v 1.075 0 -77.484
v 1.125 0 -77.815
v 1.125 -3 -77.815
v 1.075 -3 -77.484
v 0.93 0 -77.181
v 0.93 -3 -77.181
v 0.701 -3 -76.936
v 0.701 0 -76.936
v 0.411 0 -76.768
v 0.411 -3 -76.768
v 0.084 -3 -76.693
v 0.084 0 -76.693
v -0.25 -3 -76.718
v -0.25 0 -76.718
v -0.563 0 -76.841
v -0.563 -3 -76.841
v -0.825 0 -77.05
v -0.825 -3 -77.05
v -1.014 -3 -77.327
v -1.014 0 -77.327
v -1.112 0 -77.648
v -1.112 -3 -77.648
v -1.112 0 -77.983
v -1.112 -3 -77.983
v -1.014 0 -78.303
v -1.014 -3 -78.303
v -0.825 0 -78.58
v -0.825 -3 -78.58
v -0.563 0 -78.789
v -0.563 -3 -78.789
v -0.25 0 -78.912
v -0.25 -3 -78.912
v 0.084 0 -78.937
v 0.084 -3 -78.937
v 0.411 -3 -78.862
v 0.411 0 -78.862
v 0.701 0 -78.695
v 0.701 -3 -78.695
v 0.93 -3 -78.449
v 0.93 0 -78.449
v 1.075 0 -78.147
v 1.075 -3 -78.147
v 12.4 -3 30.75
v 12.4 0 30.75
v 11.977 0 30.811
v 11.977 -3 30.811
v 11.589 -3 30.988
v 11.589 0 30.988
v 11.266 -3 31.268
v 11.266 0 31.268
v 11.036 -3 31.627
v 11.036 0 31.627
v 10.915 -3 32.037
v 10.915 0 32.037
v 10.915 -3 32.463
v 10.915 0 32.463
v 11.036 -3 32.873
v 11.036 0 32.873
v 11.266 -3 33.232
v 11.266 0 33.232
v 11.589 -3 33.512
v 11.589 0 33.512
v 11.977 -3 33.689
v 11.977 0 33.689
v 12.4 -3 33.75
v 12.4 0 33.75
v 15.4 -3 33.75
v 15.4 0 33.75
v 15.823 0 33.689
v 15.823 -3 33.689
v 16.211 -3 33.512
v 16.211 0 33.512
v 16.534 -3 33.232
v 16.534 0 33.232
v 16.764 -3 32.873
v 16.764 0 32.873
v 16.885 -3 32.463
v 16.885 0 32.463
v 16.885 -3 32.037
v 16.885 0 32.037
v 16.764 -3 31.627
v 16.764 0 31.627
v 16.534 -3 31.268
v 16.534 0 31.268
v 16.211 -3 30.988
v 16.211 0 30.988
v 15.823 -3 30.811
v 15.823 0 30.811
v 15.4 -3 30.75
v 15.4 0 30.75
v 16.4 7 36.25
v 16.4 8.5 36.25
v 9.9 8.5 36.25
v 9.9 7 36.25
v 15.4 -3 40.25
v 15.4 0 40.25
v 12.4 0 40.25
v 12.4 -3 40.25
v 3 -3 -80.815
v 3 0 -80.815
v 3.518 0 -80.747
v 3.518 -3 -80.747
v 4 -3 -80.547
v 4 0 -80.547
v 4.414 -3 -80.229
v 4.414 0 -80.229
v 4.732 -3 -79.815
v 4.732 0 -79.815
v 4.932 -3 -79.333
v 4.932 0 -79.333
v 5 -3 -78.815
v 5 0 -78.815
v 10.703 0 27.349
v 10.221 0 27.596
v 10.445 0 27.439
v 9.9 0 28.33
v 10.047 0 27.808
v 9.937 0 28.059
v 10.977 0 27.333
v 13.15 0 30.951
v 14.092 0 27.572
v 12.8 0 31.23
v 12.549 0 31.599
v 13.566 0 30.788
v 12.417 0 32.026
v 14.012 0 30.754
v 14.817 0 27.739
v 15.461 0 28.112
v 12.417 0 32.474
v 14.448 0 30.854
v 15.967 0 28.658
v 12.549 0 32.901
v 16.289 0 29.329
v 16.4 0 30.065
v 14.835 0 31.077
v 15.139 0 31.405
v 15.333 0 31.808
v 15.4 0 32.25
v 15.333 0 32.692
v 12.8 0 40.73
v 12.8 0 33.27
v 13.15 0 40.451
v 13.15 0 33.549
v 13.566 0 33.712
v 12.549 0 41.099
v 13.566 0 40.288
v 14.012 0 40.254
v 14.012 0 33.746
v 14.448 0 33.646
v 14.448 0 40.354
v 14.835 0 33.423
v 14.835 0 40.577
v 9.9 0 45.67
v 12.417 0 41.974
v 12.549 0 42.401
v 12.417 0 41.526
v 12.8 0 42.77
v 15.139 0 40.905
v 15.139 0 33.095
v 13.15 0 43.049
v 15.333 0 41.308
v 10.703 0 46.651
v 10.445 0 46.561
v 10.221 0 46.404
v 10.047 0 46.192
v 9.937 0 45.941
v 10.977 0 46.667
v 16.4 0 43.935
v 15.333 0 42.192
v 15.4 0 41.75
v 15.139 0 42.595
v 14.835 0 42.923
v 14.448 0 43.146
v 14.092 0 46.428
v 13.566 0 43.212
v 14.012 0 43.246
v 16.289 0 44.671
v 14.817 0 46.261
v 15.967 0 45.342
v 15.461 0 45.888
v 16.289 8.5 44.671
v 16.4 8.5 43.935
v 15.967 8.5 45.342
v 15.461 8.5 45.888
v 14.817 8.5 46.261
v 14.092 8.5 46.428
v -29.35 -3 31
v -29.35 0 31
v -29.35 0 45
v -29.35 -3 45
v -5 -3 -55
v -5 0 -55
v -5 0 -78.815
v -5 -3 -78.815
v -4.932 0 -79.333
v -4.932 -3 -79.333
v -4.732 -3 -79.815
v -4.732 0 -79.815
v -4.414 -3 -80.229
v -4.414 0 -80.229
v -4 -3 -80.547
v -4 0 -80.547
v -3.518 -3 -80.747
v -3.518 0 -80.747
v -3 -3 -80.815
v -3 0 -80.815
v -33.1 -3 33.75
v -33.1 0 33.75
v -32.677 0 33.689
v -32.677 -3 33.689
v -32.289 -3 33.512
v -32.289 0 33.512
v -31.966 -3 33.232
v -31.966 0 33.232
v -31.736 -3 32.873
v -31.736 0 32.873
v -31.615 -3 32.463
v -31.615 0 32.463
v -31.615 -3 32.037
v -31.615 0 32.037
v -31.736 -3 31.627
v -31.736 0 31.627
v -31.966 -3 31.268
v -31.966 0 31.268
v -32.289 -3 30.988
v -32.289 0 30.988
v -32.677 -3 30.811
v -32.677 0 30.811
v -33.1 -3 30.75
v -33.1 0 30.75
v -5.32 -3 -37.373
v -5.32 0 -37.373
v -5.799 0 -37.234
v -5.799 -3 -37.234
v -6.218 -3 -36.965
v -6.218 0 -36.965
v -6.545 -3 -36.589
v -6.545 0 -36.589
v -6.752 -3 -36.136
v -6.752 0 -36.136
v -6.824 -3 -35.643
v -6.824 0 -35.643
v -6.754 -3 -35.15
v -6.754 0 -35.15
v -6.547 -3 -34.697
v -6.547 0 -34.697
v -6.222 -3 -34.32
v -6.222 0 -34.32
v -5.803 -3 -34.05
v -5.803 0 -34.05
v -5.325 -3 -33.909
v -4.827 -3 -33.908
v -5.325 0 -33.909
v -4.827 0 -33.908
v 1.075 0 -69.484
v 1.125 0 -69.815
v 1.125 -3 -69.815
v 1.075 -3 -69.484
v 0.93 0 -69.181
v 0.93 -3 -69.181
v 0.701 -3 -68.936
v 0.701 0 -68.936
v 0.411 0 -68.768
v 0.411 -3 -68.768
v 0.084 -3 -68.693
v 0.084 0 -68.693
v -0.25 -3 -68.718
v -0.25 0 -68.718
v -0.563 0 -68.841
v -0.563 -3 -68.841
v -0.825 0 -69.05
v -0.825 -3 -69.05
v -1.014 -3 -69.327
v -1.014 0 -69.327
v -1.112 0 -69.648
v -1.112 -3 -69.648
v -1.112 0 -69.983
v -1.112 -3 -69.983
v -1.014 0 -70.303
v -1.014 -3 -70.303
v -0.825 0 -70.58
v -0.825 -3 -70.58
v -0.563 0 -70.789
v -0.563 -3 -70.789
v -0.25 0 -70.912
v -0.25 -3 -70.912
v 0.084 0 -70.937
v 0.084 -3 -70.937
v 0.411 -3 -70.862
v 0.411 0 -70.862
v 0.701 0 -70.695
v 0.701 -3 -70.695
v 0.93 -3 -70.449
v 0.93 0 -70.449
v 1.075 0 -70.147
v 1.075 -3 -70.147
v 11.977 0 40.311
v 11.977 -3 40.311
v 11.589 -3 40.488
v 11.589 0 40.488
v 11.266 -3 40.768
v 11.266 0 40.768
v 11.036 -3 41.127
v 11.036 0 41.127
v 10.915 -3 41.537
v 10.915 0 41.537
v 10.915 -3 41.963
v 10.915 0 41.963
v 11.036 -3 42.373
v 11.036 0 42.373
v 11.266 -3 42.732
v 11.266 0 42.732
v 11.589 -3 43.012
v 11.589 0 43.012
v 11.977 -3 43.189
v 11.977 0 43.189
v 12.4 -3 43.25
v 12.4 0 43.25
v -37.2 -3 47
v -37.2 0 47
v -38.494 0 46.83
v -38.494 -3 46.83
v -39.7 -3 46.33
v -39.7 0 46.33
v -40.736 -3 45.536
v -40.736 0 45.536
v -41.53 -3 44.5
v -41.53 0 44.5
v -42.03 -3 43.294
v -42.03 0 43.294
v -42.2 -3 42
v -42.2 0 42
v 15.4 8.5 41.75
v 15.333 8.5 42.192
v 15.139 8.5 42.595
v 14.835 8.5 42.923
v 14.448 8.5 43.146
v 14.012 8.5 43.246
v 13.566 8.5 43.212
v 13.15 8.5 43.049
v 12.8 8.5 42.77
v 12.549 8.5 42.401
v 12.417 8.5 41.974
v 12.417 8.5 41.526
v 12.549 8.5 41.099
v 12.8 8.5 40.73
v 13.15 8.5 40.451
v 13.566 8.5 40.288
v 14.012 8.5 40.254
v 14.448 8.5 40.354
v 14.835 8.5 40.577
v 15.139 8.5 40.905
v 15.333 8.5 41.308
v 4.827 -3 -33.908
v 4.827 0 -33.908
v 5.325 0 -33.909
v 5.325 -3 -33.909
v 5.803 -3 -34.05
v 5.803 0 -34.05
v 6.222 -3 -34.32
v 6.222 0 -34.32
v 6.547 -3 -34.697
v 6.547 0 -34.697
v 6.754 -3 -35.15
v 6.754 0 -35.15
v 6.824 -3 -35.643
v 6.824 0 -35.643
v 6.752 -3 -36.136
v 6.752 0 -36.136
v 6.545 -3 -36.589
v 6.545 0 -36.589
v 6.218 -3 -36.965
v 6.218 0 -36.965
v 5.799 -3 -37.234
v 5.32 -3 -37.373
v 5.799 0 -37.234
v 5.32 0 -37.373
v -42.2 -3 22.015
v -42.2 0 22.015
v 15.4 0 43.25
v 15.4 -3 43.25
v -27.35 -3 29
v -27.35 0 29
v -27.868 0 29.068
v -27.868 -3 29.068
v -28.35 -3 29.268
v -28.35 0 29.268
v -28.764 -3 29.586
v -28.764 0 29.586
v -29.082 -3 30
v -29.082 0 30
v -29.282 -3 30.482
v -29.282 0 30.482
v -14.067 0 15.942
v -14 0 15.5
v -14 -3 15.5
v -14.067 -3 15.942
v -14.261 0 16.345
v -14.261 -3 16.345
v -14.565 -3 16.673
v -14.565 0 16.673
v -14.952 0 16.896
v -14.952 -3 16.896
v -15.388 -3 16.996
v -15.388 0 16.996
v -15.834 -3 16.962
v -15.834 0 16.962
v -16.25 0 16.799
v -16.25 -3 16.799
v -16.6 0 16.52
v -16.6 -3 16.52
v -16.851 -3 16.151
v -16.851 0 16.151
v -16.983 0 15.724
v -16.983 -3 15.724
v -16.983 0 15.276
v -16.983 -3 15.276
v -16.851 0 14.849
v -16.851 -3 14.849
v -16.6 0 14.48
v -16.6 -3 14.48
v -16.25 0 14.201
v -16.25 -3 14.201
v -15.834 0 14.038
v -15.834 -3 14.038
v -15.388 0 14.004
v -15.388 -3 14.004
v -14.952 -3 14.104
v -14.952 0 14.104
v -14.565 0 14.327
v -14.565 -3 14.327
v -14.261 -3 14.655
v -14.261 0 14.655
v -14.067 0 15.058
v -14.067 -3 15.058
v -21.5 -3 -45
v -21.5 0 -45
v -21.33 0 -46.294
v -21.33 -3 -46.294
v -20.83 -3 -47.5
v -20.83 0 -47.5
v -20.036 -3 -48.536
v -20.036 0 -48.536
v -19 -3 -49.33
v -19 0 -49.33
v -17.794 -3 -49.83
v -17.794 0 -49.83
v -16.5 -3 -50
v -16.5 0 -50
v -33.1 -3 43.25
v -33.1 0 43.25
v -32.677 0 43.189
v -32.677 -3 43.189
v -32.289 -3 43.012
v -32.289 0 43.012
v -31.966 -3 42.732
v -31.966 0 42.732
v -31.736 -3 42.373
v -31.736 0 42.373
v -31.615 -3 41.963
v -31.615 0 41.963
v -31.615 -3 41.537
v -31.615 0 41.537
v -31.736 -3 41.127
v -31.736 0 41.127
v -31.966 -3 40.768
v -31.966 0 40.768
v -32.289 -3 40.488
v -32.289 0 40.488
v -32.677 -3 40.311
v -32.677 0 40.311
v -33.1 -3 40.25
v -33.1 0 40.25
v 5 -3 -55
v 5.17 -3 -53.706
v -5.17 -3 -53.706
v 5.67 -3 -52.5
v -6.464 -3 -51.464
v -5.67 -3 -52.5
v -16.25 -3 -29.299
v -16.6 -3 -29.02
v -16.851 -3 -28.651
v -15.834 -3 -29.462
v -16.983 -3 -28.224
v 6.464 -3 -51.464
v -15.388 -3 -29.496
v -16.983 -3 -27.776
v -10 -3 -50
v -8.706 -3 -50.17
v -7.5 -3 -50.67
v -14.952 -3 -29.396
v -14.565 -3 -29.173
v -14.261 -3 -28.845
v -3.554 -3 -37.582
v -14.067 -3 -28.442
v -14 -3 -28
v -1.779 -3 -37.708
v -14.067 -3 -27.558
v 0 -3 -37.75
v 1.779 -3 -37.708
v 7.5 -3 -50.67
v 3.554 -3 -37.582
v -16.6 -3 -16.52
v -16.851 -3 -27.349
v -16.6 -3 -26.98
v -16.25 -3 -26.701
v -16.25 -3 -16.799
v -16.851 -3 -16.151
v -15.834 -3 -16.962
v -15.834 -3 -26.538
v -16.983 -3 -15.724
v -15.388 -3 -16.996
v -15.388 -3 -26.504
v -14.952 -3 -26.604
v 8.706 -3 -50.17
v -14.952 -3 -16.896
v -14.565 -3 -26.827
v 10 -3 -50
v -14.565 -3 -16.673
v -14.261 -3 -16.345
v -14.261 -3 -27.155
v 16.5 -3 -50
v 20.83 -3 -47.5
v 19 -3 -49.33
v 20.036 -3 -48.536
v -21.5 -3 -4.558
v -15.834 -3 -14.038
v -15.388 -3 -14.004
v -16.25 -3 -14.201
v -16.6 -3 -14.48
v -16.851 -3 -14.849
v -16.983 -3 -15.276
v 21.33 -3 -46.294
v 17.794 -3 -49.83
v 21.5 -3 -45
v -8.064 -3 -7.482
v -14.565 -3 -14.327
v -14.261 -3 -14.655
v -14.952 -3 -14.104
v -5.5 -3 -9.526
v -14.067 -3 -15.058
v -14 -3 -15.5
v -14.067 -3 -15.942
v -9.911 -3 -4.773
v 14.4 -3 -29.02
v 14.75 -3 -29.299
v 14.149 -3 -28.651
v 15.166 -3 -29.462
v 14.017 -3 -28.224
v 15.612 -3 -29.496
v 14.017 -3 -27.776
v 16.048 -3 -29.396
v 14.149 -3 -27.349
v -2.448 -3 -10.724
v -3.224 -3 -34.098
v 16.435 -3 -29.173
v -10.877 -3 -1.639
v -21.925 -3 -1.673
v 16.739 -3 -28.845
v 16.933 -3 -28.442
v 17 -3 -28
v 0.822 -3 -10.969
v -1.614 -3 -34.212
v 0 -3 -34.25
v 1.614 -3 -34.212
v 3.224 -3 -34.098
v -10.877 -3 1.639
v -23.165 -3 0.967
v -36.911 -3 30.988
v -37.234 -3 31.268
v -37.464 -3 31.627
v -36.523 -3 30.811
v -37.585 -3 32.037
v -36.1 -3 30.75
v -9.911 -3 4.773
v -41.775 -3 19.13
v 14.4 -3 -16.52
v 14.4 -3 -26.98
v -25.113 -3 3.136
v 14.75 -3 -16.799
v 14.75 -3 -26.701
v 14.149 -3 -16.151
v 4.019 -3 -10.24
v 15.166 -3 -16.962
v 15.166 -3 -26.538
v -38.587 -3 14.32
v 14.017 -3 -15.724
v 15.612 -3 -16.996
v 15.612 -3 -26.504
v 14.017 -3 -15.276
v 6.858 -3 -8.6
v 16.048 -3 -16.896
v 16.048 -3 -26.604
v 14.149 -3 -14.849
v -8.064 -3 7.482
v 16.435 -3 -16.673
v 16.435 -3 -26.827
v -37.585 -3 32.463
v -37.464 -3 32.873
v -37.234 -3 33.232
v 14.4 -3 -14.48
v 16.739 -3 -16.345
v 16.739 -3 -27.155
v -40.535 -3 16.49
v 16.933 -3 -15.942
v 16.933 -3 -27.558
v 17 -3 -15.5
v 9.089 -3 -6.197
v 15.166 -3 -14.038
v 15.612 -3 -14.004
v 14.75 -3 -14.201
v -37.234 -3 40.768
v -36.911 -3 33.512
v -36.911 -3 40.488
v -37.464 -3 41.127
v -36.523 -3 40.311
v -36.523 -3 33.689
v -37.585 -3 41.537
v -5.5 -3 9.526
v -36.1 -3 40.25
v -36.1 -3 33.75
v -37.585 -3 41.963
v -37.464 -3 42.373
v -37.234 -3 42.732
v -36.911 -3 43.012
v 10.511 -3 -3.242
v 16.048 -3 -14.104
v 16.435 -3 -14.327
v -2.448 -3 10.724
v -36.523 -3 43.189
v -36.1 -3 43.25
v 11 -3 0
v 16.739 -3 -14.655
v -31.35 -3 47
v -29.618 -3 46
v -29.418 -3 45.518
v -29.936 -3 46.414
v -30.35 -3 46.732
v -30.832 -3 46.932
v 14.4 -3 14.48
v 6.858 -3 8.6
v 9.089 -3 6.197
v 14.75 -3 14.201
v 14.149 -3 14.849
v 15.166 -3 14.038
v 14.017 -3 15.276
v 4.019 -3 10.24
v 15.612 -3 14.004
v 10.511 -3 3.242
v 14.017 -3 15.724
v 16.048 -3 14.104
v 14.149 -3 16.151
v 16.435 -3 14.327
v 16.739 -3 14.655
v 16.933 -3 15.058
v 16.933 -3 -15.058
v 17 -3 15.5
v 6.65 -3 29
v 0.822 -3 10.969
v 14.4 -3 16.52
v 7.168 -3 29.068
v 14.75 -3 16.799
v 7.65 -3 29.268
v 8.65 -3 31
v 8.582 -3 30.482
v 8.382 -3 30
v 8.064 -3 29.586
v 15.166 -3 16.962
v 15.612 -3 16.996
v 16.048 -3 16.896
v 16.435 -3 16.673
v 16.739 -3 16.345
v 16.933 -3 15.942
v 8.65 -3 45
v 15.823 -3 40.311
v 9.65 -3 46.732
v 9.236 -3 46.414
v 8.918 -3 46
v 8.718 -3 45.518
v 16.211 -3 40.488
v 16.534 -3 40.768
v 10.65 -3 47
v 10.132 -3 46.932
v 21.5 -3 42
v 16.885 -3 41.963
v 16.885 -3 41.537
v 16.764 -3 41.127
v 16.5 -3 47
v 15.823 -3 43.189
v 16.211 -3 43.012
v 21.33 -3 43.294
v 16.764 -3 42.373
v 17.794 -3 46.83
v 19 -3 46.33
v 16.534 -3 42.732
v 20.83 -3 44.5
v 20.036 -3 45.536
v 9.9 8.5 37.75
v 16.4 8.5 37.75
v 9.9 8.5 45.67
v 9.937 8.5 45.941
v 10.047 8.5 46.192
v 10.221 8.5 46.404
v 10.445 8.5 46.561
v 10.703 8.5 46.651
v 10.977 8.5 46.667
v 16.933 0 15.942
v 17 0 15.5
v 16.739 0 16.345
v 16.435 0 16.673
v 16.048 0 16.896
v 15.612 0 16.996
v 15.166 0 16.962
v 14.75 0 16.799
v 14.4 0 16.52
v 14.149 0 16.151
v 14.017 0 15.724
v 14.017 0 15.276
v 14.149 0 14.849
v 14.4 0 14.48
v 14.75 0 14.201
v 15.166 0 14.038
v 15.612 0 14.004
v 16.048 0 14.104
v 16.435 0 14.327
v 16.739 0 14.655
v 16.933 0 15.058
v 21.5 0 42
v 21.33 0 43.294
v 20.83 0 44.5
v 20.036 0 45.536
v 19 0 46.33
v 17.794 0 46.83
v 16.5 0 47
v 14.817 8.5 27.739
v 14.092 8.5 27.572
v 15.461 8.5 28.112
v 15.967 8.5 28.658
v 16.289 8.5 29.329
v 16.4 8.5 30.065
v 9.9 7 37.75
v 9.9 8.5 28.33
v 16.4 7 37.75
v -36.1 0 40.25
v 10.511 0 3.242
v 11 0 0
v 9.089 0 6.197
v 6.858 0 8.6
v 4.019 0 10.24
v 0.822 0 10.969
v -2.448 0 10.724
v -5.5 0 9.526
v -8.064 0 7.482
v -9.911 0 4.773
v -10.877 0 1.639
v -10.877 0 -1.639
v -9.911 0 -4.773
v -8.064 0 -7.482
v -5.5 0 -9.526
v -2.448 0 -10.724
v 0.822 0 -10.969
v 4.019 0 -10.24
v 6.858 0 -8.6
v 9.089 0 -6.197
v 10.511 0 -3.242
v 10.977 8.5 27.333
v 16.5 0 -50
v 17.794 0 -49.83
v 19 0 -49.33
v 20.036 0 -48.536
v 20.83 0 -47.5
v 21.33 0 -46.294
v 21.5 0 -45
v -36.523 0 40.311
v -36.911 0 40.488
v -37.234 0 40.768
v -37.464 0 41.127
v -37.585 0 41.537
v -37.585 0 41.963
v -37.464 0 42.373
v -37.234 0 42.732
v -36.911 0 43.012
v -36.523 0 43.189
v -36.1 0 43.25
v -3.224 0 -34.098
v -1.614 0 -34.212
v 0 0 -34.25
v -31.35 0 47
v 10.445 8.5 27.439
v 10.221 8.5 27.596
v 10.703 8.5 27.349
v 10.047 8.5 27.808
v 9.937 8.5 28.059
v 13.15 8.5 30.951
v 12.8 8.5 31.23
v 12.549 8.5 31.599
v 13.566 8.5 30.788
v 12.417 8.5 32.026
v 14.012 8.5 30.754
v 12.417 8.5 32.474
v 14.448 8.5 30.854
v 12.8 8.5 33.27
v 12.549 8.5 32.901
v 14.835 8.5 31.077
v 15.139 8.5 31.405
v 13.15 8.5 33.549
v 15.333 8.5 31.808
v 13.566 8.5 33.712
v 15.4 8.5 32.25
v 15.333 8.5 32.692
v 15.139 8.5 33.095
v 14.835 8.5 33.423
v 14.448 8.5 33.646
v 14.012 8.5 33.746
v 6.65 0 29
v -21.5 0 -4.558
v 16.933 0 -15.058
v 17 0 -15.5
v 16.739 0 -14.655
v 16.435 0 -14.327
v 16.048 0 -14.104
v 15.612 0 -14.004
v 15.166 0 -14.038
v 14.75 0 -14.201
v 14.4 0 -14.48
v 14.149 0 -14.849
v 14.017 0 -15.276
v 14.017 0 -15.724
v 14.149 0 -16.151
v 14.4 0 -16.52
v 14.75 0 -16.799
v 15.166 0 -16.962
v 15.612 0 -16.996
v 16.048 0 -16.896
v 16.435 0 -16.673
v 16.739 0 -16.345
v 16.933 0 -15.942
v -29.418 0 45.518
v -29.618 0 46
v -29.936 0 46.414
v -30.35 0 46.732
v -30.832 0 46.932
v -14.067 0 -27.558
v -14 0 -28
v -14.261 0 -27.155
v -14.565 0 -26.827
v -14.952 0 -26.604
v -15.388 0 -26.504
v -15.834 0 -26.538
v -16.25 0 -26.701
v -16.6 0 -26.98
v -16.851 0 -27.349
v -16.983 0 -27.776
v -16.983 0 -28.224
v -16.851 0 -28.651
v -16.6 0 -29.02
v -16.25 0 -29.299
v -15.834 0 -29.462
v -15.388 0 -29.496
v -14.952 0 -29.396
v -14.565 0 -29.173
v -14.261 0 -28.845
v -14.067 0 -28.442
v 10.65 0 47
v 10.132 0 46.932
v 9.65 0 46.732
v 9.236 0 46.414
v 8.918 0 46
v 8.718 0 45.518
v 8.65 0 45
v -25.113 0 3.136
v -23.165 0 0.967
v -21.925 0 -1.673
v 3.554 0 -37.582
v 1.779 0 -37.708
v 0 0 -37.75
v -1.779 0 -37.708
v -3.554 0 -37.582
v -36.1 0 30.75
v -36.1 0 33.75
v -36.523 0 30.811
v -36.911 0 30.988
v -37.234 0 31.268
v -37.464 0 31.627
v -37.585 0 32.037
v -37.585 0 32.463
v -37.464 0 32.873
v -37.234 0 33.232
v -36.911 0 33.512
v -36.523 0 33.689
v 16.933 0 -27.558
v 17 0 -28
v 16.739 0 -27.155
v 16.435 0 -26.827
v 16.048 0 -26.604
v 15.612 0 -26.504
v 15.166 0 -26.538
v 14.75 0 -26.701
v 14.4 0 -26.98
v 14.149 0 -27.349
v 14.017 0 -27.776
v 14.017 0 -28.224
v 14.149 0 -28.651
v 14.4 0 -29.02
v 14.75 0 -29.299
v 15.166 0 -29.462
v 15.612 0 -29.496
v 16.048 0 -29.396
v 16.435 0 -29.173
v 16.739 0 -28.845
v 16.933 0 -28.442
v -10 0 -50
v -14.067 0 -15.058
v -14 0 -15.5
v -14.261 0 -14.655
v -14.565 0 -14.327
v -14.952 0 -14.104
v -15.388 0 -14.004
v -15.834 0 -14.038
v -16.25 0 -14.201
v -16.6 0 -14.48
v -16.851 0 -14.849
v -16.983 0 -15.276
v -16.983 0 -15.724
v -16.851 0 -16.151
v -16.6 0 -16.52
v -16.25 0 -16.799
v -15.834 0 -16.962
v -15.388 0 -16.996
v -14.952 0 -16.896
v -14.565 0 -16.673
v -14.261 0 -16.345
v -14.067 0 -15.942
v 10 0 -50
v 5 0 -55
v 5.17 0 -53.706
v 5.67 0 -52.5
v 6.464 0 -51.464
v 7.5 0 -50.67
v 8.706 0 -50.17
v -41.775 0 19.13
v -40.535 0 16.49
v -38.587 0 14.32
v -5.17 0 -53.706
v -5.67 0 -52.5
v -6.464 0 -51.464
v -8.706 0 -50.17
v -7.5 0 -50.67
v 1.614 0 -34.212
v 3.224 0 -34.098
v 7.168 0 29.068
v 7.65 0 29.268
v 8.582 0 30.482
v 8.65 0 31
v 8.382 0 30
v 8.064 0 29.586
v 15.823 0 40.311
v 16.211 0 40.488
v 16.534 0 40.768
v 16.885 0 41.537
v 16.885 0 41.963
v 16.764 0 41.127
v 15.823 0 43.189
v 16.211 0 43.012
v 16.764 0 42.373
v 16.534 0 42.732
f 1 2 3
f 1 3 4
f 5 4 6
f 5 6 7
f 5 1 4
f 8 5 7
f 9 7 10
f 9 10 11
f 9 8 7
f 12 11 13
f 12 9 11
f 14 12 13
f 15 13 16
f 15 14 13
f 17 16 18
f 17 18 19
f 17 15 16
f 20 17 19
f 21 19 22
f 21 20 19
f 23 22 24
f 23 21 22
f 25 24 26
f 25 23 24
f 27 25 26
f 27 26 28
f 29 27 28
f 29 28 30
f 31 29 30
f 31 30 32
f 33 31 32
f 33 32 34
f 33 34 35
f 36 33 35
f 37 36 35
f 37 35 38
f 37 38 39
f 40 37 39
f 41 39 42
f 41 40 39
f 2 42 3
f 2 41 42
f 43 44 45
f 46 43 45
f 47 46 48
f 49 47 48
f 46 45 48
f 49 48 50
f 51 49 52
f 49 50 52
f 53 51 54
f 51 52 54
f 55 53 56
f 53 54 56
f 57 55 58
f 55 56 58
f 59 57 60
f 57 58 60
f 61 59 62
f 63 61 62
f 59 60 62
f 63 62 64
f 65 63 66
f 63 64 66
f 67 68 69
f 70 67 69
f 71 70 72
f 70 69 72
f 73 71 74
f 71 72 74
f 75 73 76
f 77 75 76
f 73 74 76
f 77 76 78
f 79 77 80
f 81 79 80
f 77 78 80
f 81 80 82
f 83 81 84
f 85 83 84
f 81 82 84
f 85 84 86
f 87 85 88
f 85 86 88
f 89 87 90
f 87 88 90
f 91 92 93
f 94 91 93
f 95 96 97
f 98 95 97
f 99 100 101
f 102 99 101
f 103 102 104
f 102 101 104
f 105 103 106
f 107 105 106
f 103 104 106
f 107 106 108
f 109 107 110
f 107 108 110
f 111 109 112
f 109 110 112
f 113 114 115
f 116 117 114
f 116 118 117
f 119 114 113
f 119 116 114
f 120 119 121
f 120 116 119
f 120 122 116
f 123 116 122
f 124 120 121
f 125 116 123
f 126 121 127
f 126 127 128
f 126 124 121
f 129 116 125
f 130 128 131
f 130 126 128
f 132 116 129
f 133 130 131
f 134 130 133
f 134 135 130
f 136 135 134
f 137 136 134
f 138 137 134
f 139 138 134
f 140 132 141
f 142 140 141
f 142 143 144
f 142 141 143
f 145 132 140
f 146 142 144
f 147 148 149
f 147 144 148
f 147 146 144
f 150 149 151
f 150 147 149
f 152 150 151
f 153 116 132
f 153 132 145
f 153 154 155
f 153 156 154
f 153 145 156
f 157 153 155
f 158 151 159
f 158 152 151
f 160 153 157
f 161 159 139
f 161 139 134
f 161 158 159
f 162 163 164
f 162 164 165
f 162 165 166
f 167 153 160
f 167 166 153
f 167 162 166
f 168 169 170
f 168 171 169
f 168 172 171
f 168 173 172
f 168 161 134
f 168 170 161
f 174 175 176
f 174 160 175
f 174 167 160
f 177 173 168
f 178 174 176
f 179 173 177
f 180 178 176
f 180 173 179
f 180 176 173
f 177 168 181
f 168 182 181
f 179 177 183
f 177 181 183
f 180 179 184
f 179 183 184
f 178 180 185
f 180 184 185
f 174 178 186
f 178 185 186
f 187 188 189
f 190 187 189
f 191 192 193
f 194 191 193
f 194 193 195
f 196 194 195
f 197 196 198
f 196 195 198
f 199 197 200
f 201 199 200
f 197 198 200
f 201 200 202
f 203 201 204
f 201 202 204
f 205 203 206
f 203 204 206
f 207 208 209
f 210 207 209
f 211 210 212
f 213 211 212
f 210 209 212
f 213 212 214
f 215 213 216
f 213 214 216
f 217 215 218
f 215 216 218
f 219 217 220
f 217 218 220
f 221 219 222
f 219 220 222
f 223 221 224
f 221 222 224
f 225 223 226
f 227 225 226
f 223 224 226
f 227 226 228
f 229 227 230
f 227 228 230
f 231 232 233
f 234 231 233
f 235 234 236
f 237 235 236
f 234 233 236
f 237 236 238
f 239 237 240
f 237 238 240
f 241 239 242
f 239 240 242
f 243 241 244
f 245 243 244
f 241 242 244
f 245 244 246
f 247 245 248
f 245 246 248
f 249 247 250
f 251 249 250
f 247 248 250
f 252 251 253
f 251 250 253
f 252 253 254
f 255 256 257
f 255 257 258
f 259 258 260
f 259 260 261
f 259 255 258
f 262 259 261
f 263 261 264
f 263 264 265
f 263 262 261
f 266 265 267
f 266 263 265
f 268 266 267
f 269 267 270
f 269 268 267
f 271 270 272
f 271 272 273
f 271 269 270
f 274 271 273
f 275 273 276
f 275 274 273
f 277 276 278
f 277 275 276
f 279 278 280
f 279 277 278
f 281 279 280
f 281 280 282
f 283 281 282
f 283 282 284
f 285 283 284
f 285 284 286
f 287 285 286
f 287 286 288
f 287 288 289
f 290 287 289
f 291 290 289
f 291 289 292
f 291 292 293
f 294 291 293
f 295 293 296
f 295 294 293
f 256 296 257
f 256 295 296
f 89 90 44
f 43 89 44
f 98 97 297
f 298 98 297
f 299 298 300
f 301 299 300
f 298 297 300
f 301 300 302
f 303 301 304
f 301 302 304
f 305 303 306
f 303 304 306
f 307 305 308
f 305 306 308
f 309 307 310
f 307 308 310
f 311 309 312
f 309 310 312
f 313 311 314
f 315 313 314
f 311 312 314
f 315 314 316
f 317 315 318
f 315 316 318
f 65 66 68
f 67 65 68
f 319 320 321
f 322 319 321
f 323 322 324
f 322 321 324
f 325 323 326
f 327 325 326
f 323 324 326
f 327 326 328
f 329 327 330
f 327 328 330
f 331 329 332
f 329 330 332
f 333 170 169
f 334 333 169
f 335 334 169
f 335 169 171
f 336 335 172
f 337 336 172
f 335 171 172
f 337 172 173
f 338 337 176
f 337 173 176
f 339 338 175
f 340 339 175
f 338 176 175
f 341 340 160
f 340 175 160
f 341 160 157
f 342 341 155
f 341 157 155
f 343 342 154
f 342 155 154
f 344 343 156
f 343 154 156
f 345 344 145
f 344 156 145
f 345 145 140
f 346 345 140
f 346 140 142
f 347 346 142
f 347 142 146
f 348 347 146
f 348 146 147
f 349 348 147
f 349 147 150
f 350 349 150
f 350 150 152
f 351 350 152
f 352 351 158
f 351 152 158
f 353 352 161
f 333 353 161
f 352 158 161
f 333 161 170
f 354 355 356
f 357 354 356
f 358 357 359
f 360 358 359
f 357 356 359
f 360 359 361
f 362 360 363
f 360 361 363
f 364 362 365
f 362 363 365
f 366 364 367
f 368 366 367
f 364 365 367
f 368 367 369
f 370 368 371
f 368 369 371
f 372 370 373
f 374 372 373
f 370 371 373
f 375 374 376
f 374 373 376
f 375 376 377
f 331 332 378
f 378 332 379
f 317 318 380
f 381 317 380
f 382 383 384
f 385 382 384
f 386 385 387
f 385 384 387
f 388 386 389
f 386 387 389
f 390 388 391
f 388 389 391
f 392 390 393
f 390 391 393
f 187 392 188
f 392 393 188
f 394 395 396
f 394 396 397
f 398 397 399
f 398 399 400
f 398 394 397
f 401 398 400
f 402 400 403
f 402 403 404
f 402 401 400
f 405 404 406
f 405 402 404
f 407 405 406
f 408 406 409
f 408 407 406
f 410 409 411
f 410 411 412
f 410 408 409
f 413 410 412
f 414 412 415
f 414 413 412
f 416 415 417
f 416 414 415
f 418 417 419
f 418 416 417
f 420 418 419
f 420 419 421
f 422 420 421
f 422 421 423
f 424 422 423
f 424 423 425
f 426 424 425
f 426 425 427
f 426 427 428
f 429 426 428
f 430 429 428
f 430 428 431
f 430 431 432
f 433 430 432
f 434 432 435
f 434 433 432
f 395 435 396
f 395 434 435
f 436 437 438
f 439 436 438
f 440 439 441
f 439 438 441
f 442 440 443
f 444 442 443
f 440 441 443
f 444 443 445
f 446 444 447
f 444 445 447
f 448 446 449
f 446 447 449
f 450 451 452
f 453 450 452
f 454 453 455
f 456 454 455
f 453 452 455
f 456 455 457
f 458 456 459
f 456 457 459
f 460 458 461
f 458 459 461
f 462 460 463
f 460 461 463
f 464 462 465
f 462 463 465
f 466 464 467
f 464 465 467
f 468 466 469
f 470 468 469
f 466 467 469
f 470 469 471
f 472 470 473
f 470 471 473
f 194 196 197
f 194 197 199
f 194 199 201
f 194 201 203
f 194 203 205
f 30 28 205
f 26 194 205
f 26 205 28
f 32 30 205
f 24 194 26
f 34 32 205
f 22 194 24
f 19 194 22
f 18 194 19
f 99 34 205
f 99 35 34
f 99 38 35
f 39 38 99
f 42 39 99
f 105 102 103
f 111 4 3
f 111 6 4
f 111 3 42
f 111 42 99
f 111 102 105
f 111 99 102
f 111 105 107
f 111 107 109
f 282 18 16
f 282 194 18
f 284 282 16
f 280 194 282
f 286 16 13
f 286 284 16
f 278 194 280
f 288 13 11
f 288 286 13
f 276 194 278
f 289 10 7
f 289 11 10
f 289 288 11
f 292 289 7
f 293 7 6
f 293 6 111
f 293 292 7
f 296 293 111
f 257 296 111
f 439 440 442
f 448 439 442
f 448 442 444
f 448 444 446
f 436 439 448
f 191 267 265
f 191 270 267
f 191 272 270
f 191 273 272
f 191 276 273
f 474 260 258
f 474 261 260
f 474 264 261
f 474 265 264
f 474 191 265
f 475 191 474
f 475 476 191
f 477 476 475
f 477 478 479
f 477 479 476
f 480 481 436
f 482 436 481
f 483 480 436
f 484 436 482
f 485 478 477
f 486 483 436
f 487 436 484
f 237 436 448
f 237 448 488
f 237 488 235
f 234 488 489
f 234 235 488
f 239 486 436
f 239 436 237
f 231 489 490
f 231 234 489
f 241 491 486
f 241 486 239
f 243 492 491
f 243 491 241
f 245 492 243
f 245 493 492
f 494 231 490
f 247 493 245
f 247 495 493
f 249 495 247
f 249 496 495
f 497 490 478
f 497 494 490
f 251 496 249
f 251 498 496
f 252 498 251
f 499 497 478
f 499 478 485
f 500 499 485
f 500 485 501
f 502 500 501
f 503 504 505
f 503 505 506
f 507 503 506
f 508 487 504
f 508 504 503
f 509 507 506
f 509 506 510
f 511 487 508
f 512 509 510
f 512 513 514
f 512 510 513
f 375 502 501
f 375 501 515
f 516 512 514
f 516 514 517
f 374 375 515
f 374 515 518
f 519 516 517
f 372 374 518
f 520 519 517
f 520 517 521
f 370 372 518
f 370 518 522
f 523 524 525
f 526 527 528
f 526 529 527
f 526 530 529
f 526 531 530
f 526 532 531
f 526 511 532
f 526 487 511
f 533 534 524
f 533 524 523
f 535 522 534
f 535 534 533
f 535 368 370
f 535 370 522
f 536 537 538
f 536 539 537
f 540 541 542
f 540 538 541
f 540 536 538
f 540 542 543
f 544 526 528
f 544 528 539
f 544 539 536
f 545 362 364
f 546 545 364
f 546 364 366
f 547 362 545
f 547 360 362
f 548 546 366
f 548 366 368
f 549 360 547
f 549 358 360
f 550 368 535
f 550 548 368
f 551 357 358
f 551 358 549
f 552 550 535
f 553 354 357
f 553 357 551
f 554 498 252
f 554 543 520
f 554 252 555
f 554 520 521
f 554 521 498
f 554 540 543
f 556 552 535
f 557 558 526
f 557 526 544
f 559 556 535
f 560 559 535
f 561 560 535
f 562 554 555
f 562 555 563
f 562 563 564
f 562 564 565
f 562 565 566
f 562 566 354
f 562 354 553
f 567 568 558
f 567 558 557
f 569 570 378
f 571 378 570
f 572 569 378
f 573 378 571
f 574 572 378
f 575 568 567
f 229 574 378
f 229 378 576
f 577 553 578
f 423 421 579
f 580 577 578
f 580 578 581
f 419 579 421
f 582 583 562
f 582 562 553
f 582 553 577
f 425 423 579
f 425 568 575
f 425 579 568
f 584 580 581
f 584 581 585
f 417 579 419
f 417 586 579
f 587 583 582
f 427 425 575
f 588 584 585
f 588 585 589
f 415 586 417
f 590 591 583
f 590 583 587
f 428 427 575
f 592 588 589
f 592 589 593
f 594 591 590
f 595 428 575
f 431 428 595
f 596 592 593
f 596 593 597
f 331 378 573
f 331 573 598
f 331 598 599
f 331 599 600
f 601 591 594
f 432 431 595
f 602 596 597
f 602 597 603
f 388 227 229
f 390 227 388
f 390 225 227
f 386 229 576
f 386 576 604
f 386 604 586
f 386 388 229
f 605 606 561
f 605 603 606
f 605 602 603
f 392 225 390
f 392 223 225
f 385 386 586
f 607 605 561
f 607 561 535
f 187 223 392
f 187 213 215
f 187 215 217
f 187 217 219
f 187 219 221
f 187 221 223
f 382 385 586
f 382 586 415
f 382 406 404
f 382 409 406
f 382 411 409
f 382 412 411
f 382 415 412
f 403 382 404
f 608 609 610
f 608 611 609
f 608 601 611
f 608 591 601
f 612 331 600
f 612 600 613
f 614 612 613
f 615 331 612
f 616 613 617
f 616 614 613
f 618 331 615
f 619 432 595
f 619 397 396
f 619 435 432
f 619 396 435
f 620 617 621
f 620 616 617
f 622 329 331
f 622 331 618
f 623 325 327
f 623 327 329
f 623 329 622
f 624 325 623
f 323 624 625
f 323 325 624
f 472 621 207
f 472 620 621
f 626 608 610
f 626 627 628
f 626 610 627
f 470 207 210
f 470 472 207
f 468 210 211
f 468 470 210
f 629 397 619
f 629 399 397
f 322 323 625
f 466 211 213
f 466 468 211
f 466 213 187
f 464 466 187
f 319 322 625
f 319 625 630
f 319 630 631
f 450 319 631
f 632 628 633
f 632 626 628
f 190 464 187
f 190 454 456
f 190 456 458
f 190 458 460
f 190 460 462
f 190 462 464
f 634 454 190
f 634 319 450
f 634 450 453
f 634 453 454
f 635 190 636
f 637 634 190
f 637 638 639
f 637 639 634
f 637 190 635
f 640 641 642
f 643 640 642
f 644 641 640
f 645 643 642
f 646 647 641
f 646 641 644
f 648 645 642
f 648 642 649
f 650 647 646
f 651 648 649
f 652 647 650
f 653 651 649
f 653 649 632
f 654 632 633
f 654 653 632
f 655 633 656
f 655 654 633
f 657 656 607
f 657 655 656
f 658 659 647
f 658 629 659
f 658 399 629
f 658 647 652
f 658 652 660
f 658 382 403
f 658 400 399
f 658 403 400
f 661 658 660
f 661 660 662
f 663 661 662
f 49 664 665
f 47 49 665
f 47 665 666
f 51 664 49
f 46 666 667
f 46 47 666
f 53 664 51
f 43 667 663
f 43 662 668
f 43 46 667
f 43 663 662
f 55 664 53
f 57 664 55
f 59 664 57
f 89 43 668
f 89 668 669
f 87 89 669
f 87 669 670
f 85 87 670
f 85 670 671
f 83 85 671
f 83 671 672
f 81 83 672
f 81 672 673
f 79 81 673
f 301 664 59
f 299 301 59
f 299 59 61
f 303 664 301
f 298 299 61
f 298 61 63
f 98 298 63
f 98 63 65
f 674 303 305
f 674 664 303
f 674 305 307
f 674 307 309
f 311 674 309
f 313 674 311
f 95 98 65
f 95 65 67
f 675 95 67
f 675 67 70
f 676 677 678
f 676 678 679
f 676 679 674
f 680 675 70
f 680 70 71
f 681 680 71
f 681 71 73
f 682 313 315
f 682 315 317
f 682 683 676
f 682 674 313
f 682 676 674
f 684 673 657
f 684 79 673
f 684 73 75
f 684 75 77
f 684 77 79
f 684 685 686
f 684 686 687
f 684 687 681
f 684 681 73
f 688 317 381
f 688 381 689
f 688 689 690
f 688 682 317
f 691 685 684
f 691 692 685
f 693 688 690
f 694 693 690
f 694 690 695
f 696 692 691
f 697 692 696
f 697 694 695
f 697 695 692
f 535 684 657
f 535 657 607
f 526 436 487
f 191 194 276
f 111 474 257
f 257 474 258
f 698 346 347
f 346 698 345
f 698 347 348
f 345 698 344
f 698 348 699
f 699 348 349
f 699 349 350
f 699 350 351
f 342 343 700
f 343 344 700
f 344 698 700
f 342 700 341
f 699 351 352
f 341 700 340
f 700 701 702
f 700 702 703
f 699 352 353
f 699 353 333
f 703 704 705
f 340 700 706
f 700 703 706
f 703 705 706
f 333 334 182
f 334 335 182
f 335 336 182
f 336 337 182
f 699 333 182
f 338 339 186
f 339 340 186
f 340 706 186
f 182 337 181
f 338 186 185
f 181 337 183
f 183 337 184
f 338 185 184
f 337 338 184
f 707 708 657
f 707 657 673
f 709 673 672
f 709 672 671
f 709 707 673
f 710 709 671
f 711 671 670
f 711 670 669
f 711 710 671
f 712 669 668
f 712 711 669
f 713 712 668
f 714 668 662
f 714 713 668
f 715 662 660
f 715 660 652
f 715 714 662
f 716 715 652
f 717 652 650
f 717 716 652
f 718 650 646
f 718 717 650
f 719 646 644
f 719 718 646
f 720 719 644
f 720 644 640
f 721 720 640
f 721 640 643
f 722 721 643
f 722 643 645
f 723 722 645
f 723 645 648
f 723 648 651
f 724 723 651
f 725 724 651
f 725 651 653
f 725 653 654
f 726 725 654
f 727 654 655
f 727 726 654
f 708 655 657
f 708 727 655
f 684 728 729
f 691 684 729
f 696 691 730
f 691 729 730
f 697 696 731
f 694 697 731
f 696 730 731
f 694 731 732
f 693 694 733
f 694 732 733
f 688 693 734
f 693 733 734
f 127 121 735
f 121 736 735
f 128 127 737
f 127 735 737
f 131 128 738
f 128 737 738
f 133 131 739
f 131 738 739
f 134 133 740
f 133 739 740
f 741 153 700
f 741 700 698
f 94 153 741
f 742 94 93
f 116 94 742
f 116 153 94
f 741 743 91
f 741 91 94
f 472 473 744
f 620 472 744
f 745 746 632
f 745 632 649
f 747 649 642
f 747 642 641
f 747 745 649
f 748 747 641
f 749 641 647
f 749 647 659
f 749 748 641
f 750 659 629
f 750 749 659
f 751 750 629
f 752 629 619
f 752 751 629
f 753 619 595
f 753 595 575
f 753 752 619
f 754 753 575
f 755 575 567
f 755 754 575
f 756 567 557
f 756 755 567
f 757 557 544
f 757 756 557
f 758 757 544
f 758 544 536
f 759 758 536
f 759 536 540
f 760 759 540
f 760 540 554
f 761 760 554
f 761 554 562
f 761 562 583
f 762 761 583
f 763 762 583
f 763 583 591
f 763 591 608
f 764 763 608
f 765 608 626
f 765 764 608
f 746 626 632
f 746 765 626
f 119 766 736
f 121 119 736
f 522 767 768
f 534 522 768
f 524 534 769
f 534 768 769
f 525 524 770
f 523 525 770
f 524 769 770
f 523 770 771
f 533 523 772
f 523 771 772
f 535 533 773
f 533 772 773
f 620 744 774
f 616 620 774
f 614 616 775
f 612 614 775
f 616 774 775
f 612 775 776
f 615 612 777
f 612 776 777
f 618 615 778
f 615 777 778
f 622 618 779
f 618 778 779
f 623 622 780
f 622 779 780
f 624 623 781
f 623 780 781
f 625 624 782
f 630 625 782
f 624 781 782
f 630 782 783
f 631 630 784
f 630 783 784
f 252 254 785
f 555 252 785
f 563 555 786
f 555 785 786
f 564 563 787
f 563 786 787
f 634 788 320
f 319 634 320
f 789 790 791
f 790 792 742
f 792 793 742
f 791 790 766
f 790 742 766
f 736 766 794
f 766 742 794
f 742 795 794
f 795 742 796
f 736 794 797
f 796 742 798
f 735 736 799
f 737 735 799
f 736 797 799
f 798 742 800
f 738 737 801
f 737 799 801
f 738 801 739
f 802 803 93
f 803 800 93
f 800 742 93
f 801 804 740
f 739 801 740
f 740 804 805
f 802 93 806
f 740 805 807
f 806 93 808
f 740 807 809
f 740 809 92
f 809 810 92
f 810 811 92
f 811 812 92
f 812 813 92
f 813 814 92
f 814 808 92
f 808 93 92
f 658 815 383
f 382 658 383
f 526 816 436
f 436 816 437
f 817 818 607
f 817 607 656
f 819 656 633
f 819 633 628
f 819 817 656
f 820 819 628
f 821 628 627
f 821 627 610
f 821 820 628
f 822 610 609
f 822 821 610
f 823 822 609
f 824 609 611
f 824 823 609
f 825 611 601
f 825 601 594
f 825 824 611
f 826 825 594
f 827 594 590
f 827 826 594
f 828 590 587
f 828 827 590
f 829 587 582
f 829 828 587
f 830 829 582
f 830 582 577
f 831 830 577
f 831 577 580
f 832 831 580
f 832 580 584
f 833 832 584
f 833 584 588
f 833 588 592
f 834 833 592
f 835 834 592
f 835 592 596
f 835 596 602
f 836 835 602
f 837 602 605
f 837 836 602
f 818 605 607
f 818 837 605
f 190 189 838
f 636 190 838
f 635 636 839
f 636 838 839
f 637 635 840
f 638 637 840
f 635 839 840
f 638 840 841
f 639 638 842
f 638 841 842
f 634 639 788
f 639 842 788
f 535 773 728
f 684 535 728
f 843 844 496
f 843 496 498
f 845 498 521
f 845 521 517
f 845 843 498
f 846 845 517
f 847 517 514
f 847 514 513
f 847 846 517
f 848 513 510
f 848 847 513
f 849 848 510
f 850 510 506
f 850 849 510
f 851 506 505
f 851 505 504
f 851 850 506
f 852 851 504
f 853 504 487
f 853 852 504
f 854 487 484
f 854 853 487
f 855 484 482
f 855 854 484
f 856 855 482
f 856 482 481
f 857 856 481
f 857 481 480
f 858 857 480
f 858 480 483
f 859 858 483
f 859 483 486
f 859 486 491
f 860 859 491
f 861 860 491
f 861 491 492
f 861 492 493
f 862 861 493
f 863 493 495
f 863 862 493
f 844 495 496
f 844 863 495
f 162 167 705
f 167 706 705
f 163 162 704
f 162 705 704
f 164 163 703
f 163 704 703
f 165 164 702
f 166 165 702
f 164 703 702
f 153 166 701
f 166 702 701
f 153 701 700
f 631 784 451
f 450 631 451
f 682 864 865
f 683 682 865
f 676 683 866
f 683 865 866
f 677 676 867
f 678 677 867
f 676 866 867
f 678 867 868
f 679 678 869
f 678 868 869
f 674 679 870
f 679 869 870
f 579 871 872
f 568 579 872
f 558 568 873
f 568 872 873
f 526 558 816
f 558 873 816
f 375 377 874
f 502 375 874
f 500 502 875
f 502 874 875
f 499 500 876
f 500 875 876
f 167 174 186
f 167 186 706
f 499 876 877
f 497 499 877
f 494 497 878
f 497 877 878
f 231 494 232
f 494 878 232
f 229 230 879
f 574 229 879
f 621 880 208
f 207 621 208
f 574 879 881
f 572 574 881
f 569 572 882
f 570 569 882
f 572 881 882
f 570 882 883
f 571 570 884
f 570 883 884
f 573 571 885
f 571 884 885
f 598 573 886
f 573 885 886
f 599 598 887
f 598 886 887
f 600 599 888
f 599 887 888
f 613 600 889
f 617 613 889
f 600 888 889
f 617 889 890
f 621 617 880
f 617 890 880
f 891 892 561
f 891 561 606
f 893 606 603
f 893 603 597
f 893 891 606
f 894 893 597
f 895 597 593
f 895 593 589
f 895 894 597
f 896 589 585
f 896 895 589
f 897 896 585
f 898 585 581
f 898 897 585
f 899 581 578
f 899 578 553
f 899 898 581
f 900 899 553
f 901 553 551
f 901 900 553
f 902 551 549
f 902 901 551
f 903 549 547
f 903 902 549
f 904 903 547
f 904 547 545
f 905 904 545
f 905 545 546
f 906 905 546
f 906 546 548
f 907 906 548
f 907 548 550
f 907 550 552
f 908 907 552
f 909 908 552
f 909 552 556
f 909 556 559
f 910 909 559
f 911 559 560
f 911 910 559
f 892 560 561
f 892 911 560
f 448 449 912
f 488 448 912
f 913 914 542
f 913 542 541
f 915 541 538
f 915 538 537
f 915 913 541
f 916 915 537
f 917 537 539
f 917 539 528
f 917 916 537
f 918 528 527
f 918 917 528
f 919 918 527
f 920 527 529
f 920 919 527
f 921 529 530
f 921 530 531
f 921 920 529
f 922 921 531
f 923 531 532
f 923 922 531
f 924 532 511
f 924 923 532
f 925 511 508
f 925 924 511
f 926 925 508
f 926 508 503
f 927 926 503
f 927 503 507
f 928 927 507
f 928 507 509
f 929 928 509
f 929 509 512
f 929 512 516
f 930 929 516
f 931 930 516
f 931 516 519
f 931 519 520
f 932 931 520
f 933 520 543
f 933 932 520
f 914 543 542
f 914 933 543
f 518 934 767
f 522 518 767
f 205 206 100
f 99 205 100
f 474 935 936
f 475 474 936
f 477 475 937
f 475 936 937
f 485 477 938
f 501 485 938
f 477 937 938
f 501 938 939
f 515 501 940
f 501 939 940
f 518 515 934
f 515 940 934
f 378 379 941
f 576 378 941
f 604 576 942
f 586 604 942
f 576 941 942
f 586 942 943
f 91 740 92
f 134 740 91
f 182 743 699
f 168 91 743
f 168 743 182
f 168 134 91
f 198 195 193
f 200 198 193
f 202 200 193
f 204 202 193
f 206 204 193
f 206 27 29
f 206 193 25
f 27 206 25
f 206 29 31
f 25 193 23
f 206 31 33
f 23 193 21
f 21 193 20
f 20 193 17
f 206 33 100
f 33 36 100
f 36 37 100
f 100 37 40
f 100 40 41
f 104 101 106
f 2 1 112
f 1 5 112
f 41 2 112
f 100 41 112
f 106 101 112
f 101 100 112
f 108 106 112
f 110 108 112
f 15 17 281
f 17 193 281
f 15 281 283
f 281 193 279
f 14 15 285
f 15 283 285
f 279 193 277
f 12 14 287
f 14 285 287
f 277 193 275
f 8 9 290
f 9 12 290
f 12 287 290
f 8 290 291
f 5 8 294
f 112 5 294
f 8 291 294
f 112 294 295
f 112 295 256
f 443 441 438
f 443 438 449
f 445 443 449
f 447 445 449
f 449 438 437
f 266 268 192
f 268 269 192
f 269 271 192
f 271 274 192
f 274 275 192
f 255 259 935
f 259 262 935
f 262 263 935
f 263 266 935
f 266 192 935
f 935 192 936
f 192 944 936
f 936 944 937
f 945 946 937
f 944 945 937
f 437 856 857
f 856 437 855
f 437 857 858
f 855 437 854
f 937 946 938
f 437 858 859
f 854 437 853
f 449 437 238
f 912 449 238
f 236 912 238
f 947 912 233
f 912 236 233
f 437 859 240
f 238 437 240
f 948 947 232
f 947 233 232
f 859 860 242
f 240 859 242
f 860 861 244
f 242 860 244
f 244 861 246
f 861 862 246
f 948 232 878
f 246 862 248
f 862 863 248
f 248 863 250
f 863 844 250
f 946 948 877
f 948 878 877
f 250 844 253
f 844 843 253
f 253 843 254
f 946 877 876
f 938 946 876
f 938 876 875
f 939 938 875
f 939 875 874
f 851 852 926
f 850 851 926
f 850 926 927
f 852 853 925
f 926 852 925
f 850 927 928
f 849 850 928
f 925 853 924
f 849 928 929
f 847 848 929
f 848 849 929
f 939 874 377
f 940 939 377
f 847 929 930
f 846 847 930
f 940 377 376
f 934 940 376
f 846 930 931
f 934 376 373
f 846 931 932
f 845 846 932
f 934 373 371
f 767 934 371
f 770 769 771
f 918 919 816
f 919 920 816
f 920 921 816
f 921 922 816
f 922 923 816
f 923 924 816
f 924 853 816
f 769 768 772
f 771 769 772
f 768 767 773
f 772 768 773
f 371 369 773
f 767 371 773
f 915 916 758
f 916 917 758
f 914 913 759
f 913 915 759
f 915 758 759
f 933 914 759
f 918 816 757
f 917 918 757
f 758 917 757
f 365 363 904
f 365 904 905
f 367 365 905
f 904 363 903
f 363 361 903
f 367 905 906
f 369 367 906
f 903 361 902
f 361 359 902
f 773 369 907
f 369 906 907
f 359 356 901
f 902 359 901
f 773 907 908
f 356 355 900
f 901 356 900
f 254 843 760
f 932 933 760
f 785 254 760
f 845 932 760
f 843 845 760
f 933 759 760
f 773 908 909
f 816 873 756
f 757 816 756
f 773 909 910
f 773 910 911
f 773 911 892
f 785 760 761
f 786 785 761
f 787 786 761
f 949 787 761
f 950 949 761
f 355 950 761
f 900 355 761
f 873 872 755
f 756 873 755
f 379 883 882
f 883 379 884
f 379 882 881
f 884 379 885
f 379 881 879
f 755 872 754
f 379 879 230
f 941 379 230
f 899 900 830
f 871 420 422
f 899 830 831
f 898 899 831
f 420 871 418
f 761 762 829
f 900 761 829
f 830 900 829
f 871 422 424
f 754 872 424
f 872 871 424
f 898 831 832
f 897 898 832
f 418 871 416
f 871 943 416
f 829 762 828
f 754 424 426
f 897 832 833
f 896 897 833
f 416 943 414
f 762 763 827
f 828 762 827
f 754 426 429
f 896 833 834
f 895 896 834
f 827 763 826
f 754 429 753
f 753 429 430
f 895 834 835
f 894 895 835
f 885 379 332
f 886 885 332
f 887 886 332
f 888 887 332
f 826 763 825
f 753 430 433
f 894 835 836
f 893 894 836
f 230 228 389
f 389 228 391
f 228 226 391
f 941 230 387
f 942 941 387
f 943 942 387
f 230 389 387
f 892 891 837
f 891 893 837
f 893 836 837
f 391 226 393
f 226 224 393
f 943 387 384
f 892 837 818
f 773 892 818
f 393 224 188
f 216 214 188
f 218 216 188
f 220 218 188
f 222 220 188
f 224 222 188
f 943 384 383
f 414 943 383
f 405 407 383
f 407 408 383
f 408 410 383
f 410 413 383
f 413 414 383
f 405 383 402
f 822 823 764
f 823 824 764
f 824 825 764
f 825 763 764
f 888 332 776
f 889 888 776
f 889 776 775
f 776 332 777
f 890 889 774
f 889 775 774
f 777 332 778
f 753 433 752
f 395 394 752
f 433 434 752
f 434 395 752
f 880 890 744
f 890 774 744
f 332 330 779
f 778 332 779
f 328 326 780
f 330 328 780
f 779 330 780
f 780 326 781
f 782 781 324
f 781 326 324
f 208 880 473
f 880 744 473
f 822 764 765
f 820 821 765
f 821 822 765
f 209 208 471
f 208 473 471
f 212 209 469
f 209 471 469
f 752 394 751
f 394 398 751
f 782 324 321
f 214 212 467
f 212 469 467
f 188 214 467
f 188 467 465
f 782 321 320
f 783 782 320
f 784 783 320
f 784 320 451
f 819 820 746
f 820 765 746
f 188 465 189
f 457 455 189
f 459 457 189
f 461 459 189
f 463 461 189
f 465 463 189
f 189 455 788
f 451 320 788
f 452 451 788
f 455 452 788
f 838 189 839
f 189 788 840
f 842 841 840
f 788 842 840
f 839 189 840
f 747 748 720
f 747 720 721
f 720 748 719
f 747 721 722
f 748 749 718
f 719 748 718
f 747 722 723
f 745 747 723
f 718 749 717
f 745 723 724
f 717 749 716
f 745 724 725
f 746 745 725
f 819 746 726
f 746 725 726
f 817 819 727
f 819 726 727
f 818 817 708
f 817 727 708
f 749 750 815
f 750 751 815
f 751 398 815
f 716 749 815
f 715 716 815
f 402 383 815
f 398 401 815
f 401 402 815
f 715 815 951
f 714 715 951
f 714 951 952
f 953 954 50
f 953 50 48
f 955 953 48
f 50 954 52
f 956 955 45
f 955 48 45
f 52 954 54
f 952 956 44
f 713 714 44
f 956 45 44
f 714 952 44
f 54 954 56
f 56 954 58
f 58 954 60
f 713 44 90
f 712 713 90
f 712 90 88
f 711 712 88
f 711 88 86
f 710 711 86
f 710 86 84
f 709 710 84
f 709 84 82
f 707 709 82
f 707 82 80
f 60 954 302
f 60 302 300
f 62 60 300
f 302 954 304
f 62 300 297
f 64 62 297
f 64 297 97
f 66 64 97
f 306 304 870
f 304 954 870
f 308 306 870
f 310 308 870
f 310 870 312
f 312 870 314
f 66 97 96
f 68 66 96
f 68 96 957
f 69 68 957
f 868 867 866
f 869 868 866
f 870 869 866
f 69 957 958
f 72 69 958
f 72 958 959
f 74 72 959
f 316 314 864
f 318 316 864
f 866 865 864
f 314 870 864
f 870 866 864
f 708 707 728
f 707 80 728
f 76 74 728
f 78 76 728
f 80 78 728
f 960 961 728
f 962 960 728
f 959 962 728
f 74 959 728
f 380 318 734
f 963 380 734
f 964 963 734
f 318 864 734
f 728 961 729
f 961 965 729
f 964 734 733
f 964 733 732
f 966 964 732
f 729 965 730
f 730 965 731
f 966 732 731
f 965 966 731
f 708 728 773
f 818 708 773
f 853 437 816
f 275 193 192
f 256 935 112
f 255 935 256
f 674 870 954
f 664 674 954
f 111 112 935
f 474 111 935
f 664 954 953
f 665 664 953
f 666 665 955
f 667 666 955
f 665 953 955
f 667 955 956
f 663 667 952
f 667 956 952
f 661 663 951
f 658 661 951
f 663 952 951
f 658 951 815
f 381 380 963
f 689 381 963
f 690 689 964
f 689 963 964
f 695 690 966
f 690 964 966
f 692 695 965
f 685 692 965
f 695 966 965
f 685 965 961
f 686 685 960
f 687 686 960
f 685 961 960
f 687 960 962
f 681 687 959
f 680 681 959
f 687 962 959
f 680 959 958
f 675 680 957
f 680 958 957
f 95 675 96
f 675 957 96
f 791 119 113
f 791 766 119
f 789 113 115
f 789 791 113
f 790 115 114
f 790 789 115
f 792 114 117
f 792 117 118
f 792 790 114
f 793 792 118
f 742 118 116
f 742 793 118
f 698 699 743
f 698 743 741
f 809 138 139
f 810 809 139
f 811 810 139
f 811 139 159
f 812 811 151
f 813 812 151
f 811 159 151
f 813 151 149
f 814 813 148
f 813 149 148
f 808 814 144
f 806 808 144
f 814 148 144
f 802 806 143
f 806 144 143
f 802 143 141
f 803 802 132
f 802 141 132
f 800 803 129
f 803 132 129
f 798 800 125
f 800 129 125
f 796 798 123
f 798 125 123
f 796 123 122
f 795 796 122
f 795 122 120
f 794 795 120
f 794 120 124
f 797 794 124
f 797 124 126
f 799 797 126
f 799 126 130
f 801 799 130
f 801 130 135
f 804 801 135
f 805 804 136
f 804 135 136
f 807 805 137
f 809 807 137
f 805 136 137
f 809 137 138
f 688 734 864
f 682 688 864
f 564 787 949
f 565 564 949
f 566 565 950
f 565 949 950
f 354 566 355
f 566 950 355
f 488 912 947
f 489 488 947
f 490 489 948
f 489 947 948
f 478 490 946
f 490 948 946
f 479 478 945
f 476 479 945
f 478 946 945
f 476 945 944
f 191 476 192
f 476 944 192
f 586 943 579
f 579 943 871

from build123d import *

# Parameters (mm, degrees)
F1_R     = 1.5
F1_R_2   = 1.125
F1_R_3   = 11
F2_DEPTH = 3
F3_R     = 1.5
F4_DEPTH = 8.5
F5_W     = 6.5
F5_H     = 1.5
F6_DEPTH = 1.5
F7_R     = 1
F8_R     = 2.5


with BuildPart() as f2:
    # F1 (on Front) → F2 (new body)
    with BuildSketch(Plane.XZ):
        with BuildLine():
            ThreePointArc((16.5, -50), (20.035534, -48.535534), (21.5, -45))
            Line((21.5, -45), (21.5, 42))
            ThreePointArc((21.5, 42), (20.035534, 45.535534), (16.5, 47))
            Line((16.5, 47), (10.65, 47))
            ThreePointArc((10.65, 47), (9.235786, 46.414214), (8.65, 45))
            Line((8.65, 45), (8.65, 31))
            ThreePointArc((8.65, 31), (8.064214, 29.585786), (6.65, 29))
            Line((6.65, 29), (-27.35, 29))
            ThreePointArc((-27.35, 29), (-28.764214, 29.585786), (-29.35, 31))
            Line((-29.35, 31), (-29.35, 45))
            ThreePointArc((-29.35, 45), (-29.935786, 46.414214), (-31.35, 47))
            Line((-31.35, 47), (-37.2, 47))
            ThreePointArc((-37.2, 47), (-40.735534, 45.535534), (-42.2, 42))
            Line((-42.2, 42), (-42.2, 22.015033))
            ThreePointArc((-42.2, 22.015033), (-41.251777, 17.7647), (-38.586933, 14.320419))
            Line((-38.586933, 14.320419), (-25.113067, 3.136405))
            ThreePointArc((-25.113067, 3.136405), (-22.448223, -0.307876), (-21.5, -4.558209))
            Line((-21.5, -4.558209), (-21.5, -45))
            ThreePointArc((-21.5, -45), (-20.035534, -48.535534), (-16.5, -50))
            Line((-16.5, -50), (-10, -50))
            ThreePointArc((-10, -50), (-6.464466, -51.464466), (-5, -55))
            Line((-5, -55), (-5, -78.815218))
            ThreePointArc((-5, -78.815218), (-4.414214, -80.229432), (-3, -80.815218))
            Line((-3, -80.815218), (3, -80.815218))
            ThreePointArc((3, -80.815218), (4.414214, -80.229432), (5, -78.815218))
            Line((5, -78.815218), (5, -55))
            ThreePointArc((5, -55), (6.464466, -51.464466), (10, -50))
            Line((10, -50), (16.5, -50))
        make_face()
        with Locations((-15.5, -28)):
            Circle(F1_R, mode=Mode.SUBTRACT)
        with Locations((0, -77.815218)):
            Circle(F1_R_2, mode=Mode.SUBTRACT)
        with Locations((0, -69.815218)):
            Circle(F1_R_2, mode=Mode.SUBTRACT)
        with BuildLine():
            ThreePointArc((0, -34.25), (2.419604, -34.164426), (4.827117, -33.908132))
            ThreePointArc((4.827117, -33.908132), (6.80629, -35.394024), (5.320399, -37.373197))
            ThreePointArc((5.320399, -37.373197), (2.666863, -37.655681), (0, -37.75))
            ThreePointArc((0, -37.75), (-2.666863, -37.655681), (-5.320399, -37.373197))
            ThreePointArc((-5.320399, -37.373197), (-6.80629, -35.394024), (-4.827117, -33.908132))
            ThreePointArc((-4.827117, -33.908132), (-2.419604, -34.164426), (0, -34.25))
        make_face(mode=Mode.SUBTRACT)
        with Locations((15.5, -28)):
            Circle(F1_R, mode=Mode.SUBTRACT)
        with Locations((-15.5, -15.5)):
            Circle(F1_R, mode=Mode.SUBTRACT)
        with BuildLine():
            ThreePointArc((-36.1, 30.75), (-37.6, 32.25), (-36.1, 33.75))
            Line((-36.1, 33.75), (-33.1, 33.75))
            ThreePointArc((-33.1, 33.75), (-31.6, 32.25), (-33.1, 30.75))
            Line((-33.1, 30.75), (-36.1, 30.75))
        make_face(mode=Mode.SUBTRACT)
        with BuildLine():
            Line((-33.1, 40.25), (-36.1, 40.25))
            ThreePointArc((-36.1, 40.25), (-37.6, 41.75), (-36.1, 43.25))
            Line((-36.1, 43.25), (-33.1, 43.25))
            ThreePointArc((-33.1, 43.25), (-31.6, 41.75), (-33.1, 40.25))
        make_face(mode=Mode.SUBTRACT)
        with Locations((-15.5, 15.5)):
            Circle(F1_R, mode=Mode.SUBTRACT)
        Circle(F1_R_3, mode=Mode.SUBTRACT)
        with Locations((15.5, -15.5)):
            Circle(F1_R, mode=Mode.SUBTRACT)
        with Locations((15.5, 15.5)):
            Circle(F1_R, mode=Mode.SUBTRACT)
        with BuildLine():
            Line((15.4, 30.75), (12.4, 30.75))
            ThreePointArc((12.4, 30.75), (10.9, 32.25), (12.4, 33.75))
            Line((12.4, 33.75), (15.4, 33.75))
            ThreePointArc((15.4, 33.75), (16.9, 32.25), (15.4, 30.75))
        make_face(mode=Mode.SUBTRACT)
        with BuildLine():
            Line((15.4, 40.25), (12.4, 40.25))
            ThreePointArc((12.4, 40.25), (10.9, 41.75), (12.4, 43.25))
            Line((12.4, 43.25), (15.4, 43.25))
            ThreePointArc((15.4, 43.25), (16.9, 41.75), (15.4, 40.25))
        make_face(mode=Mode.SUBTRACT)
    extrude(amount=F2_DEPTH)


with BuildPart() as f4:
    # F3 (on Front) → F4 (new body)
    with BuildSketch(Plane.XZ):
        Polygon((16.4, 27.75), (16.4, 46.25), (9.9, 46.75), (9.9, 27.25), align=None)
        with Locations((13.9, 32.25)):
            Circle(F3_R, mode=Mode.SUBTRACT)
        with Locations((13.9, 41.75)):
            Circle(F3_R, mode=Mode.SUBTRACT)
    extrude(amount=-F4_DEPTH)

    # F5 (on face) → F6 (cut)
    with BuildSketch(Plane(origin=(0, 8.5, 0), x_dir=(-1, 0, 0), z_dir=(0, 1, 0))):
        with Locations((-13.15, 37)):
            Rectangle(F5_W, F5_H)
    extrude(amount=-F6_DEPTH, mode=Mode.SUBTRACT)

    # F7
    f7_edges = [f4.edges().sort_by_distance(p)[0] for p in [
        (9.9, 4.25, 46.75),
        (9.9, 4.25, 27.25),
    ]]
    fillet(f7_edges, radius=F7_R)

    # F8
    f8_edges = [f4.edges().sort_by_distance(p)[0] for p in [
        (16.4, 4.25, 27.75),
        (16.4, 4.25, 46.25),
    ]]
    fillet(f8_edges, radius=F8_R)


solid = Compound([f2.part, f4.part])
